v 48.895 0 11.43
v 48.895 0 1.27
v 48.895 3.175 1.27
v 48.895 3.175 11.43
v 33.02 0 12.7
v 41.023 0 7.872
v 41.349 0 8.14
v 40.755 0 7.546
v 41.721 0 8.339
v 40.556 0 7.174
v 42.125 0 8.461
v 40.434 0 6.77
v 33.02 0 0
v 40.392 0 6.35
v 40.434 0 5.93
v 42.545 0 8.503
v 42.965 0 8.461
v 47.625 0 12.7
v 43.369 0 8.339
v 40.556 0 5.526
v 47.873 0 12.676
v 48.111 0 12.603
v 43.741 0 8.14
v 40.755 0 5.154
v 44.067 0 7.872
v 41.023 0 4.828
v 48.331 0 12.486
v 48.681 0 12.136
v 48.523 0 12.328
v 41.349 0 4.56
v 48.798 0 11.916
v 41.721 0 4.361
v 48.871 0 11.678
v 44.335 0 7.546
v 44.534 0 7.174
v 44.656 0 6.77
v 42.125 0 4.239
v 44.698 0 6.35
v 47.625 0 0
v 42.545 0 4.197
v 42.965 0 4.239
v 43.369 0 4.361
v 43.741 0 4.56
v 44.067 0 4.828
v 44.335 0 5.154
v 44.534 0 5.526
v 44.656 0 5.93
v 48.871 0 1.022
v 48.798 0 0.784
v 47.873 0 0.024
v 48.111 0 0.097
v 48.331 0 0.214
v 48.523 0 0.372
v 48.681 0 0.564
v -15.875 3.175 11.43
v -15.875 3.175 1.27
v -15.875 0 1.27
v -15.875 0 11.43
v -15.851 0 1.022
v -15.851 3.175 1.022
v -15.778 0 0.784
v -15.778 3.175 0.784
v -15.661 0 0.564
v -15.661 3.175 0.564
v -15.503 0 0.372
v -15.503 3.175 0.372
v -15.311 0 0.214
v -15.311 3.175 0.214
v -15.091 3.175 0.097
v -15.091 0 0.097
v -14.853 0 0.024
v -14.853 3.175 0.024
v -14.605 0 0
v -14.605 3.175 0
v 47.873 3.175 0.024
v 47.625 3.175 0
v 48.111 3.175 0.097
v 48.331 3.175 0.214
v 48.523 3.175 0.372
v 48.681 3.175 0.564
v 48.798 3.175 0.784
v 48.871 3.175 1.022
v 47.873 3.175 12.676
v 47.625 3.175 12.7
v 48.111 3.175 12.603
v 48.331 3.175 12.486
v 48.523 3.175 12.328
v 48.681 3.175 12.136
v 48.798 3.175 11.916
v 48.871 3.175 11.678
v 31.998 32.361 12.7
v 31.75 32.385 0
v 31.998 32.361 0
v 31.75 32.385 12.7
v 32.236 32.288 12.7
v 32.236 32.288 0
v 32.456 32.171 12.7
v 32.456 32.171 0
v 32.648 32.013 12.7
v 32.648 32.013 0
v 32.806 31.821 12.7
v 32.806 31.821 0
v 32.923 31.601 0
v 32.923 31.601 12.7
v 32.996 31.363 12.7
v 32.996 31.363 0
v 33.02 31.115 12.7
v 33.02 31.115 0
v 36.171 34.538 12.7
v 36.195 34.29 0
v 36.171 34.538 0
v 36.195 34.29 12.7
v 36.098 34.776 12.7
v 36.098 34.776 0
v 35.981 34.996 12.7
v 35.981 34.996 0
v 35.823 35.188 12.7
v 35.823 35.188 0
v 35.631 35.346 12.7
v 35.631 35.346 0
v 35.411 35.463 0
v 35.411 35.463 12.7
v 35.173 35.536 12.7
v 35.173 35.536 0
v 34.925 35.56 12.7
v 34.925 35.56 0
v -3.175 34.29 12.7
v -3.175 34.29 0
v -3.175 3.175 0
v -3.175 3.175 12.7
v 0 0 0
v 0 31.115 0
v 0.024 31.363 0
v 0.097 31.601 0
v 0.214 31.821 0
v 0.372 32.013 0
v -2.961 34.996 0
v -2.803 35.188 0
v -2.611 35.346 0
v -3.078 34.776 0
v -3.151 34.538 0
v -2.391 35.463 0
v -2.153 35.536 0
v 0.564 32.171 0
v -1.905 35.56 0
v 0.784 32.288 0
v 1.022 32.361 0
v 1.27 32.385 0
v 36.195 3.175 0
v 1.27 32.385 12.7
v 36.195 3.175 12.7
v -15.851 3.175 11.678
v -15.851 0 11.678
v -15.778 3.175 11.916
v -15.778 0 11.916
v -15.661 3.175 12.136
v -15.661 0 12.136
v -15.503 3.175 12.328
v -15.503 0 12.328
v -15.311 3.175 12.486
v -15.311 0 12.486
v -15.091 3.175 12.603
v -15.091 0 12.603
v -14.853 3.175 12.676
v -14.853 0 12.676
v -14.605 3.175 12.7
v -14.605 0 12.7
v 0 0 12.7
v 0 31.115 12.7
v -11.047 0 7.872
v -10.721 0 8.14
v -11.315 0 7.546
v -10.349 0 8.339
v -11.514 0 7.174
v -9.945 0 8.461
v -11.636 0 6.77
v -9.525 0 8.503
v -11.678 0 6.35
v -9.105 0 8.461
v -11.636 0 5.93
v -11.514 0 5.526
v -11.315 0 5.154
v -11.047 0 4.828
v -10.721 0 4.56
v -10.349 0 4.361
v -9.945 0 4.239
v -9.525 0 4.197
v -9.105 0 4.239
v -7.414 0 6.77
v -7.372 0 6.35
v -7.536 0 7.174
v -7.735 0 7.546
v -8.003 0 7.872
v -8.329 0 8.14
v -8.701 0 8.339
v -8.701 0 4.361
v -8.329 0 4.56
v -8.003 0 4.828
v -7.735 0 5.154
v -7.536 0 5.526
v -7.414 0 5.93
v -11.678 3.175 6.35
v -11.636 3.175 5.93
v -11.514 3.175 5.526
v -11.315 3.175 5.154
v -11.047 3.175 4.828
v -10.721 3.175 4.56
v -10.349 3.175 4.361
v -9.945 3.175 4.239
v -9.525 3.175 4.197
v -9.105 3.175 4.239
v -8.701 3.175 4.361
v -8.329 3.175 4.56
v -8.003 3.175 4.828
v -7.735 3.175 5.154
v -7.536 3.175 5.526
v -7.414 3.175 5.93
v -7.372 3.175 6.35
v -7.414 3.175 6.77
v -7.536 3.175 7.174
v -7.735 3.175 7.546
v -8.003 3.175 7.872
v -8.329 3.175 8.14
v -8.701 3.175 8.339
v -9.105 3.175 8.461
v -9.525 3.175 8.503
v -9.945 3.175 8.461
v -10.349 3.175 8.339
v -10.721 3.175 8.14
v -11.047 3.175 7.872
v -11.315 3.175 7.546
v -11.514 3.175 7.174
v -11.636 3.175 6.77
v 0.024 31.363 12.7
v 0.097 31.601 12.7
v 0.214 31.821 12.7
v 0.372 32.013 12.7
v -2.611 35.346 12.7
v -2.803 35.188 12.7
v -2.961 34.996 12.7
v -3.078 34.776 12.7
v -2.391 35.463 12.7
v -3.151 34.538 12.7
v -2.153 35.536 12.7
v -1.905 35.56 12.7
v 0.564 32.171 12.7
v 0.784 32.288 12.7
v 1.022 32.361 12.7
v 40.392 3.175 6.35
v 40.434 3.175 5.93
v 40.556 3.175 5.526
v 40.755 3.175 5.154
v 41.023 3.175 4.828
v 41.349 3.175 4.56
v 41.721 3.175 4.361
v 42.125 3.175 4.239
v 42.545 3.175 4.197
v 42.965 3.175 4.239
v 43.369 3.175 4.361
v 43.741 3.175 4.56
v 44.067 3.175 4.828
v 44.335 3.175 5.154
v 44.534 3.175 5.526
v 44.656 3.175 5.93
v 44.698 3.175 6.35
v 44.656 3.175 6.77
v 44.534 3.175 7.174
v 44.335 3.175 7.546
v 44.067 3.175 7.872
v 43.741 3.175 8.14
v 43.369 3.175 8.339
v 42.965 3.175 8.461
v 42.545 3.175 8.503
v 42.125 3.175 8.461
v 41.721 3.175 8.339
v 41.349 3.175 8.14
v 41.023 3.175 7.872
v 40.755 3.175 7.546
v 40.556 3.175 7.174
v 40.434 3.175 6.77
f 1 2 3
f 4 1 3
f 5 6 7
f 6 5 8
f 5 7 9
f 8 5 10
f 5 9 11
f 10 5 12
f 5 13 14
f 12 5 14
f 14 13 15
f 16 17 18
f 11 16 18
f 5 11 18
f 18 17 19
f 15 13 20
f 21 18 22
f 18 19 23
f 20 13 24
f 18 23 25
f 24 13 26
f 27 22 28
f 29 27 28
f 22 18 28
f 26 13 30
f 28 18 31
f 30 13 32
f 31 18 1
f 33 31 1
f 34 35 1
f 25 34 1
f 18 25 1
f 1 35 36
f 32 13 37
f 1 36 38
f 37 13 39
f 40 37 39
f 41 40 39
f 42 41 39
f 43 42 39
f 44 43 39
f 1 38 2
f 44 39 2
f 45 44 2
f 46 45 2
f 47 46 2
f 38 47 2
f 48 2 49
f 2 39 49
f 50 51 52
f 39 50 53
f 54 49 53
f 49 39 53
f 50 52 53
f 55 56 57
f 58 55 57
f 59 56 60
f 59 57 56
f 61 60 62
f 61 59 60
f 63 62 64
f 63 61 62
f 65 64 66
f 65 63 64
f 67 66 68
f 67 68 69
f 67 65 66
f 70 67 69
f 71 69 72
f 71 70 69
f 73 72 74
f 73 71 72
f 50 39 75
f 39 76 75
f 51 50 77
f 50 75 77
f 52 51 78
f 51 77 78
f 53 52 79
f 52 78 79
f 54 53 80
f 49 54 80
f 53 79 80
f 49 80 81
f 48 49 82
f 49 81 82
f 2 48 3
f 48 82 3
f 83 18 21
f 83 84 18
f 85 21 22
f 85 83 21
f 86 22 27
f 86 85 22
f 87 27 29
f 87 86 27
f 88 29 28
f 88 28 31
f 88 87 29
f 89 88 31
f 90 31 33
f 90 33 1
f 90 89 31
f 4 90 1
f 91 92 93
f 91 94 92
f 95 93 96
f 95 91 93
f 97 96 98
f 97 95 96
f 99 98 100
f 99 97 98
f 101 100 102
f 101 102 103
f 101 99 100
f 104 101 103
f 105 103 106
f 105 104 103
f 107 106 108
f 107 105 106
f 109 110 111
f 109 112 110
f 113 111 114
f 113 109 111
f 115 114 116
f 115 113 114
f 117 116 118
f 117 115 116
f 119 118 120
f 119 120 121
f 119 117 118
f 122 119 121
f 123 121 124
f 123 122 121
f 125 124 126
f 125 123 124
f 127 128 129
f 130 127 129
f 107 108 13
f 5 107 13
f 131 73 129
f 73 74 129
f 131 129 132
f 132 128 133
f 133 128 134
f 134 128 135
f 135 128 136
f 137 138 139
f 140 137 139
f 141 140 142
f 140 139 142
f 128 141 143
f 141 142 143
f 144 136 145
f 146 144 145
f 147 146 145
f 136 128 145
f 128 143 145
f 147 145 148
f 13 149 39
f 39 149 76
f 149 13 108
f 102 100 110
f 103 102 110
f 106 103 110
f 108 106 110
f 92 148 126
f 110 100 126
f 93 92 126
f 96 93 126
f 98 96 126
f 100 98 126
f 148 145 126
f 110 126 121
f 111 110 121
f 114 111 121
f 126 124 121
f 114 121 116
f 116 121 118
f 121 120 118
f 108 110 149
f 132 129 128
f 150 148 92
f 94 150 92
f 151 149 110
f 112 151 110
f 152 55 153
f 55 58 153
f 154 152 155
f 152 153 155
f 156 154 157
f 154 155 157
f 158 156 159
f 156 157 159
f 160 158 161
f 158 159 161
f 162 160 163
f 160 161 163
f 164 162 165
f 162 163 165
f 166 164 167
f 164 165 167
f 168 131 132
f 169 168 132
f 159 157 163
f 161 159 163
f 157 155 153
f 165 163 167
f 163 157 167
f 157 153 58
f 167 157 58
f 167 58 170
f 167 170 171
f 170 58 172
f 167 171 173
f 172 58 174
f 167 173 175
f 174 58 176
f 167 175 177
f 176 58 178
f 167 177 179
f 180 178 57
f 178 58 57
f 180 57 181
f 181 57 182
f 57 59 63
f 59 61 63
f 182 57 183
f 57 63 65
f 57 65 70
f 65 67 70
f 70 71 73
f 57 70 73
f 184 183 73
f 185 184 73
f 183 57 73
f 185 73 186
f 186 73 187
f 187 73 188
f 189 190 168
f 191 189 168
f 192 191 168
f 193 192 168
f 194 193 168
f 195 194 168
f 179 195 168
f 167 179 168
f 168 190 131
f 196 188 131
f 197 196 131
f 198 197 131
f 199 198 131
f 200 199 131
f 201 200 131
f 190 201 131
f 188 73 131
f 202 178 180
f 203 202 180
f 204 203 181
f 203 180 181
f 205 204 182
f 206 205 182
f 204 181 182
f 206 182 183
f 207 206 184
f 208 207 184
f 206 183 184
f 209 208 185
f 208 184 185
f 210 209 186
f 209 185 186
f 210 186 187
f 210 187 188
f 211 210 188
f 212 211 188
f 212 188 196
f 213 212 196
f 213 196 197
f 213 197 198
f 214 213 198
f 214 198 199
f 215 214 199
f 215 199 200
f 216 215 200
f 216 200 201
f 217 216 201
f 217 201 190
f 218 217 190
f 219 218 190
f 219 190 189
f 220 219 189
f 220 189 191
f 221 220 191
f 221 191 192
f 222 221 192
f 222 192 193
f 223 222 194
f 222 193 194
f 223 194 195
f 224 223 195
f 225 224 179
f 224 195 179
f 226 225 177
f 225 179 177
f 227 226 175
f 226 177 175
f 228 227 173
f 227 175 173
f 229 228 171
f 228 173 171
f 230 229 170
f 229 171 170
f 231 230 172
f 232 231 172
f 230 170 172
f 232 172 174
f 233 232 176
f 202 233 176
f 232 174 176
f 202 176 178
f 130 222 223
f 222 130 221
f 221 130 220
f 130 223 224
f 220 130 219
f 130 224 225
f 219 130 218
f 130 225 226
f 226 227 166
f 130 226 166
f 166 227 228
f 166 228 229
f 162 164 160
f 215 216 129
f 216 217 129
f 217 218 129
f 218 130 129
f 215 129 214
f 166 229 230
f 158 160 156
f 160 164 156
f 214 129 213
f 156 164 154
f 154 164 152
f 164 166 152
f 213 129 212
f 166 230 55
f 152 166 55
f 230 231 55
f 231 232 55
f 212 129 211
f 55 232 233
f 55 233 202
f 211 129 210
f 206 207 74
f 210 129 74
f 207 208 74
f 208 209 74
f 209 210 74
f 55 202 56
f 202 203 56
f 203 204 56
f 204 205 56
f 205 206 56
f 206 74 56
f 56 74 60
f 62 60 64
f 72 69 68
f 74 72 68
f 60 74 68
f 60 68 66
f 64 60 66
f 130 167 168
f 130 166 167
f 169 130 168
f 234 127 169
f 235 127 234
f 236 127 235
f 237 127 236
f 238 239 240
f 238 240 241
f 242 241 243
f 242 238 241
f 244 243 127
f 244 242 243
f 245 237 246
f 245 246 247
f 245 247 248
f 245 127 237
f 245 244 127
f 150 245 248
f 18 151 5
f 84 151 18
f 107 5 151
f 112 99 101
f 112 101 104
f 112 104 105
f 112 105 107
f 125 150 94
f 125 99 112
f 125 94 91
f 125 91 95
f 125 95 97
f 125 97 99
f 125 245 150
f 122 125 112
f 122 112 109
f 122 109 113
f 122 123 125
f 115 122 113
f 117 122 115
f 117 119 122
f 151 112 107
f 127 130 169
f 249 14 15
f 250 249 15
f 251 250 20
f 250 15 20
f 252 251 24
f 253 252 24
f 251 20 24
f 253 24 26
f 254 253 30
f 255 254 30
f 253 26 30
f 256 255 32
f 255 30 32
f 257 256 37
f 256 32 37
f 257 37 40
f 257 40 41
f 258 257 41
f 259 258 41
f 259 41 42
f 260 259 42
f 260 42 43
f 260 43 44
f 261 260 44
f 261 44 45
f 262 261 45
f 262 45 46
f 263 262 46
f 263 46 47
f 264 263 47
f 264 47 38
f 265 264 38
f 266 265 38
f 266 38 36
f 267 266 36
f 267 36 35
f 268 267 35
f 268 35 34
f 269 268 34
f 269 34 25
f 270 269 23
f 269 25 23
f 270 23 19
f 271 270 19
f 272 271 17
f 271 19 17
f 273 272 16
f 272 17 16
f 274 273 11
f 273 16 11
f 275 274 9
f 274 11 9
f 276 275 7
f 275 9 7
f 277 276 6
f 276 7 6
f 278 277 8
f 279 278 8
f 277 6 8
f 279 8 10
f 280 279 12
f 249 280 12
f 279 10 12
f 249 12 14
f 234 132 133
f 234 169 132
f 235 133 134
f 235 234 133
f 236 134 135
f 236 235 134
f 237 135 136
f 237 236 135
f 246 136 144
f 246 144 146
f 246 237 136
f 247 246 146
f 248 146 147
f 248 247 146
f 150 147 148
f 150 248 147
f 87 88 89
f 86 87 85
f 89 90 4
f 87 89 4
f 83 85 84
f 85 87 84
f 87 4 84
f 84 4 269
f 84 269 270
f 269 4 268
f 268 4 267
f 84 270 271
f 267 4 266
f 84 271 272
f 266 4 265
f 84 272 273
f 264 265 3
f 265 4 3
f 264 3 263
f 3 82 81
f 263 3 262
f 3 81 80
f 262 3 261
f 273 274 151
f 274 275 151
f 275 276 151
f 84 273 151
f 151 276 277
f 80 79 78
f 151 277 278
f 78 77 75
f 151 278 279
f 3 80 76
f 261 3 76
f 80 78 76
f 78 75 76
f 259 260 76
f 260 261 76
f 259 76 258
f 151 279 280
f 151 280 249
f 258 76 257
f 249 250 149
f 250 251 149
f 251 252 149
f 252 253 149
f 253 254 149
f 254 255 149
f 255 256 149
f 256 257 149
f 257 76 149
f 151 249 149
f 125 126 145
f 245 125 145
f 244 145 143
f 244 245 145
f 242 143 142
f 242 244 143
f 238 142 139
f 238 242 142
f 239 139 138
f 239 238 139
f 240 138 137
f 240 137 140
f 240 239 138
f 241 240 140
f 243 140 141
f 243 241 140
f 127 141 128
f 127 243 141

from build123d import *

# Parameters (mm, degrees)
BOSS_EXTRUDE1_DEPTH   = 12.7
F_6_CLEARANCE_HOLE1_D = 4.3053
FILLET1_R             = 1.27


with BuildPart() as part:
    # Sketch1 → Boss-Extrude1 (new body)
    with BuildSketch(Plane.XY):
        Polygon((-15.875, 0), (0, 0), (0, 32.385), (33.02, 32.385), (33.02, 0), (48.895, 0), (48.895, 3.175), (36.195, 3.175), (36.195, 35.56), (-3.175, 35.56), (-3.175, 3.175), (-15.875, 3.175), align=None)
    extrude(amount=BOSS_EXTRUDE1_DEPTH)

    # #6 Clearance Hole1 (through all)
    with Locations(Plane(origin=(0, 3.175, 0), x_dir=(1, 0, 0), z_dir=(0, 1, 0))):
        with Locations((-9.525, -6.35), (42.545, -6.35)):
            Hole(F_6_CLEARANCE_HOLE1_D / 2)

    # Fillet1
    fillet1_edges = [part.edges().sort_by_distance(p)[0] for p in [
        (48.895, 1.5875, 0),
        (-15.875, 1.5875, 0),
        (-3.175, 35.56, 6.35),
        (36.195, 35.56, 6.35),
        (33.02, 32.385, 6.35),
        (0, 32.385, 6.35),
        (48.895, 1.5875, 12.7),
        (-15.875, 1.5875, 12.7),
    ]]
    fillet(fillet1_edges, radius=FILLET1_R)


solid = part.part
